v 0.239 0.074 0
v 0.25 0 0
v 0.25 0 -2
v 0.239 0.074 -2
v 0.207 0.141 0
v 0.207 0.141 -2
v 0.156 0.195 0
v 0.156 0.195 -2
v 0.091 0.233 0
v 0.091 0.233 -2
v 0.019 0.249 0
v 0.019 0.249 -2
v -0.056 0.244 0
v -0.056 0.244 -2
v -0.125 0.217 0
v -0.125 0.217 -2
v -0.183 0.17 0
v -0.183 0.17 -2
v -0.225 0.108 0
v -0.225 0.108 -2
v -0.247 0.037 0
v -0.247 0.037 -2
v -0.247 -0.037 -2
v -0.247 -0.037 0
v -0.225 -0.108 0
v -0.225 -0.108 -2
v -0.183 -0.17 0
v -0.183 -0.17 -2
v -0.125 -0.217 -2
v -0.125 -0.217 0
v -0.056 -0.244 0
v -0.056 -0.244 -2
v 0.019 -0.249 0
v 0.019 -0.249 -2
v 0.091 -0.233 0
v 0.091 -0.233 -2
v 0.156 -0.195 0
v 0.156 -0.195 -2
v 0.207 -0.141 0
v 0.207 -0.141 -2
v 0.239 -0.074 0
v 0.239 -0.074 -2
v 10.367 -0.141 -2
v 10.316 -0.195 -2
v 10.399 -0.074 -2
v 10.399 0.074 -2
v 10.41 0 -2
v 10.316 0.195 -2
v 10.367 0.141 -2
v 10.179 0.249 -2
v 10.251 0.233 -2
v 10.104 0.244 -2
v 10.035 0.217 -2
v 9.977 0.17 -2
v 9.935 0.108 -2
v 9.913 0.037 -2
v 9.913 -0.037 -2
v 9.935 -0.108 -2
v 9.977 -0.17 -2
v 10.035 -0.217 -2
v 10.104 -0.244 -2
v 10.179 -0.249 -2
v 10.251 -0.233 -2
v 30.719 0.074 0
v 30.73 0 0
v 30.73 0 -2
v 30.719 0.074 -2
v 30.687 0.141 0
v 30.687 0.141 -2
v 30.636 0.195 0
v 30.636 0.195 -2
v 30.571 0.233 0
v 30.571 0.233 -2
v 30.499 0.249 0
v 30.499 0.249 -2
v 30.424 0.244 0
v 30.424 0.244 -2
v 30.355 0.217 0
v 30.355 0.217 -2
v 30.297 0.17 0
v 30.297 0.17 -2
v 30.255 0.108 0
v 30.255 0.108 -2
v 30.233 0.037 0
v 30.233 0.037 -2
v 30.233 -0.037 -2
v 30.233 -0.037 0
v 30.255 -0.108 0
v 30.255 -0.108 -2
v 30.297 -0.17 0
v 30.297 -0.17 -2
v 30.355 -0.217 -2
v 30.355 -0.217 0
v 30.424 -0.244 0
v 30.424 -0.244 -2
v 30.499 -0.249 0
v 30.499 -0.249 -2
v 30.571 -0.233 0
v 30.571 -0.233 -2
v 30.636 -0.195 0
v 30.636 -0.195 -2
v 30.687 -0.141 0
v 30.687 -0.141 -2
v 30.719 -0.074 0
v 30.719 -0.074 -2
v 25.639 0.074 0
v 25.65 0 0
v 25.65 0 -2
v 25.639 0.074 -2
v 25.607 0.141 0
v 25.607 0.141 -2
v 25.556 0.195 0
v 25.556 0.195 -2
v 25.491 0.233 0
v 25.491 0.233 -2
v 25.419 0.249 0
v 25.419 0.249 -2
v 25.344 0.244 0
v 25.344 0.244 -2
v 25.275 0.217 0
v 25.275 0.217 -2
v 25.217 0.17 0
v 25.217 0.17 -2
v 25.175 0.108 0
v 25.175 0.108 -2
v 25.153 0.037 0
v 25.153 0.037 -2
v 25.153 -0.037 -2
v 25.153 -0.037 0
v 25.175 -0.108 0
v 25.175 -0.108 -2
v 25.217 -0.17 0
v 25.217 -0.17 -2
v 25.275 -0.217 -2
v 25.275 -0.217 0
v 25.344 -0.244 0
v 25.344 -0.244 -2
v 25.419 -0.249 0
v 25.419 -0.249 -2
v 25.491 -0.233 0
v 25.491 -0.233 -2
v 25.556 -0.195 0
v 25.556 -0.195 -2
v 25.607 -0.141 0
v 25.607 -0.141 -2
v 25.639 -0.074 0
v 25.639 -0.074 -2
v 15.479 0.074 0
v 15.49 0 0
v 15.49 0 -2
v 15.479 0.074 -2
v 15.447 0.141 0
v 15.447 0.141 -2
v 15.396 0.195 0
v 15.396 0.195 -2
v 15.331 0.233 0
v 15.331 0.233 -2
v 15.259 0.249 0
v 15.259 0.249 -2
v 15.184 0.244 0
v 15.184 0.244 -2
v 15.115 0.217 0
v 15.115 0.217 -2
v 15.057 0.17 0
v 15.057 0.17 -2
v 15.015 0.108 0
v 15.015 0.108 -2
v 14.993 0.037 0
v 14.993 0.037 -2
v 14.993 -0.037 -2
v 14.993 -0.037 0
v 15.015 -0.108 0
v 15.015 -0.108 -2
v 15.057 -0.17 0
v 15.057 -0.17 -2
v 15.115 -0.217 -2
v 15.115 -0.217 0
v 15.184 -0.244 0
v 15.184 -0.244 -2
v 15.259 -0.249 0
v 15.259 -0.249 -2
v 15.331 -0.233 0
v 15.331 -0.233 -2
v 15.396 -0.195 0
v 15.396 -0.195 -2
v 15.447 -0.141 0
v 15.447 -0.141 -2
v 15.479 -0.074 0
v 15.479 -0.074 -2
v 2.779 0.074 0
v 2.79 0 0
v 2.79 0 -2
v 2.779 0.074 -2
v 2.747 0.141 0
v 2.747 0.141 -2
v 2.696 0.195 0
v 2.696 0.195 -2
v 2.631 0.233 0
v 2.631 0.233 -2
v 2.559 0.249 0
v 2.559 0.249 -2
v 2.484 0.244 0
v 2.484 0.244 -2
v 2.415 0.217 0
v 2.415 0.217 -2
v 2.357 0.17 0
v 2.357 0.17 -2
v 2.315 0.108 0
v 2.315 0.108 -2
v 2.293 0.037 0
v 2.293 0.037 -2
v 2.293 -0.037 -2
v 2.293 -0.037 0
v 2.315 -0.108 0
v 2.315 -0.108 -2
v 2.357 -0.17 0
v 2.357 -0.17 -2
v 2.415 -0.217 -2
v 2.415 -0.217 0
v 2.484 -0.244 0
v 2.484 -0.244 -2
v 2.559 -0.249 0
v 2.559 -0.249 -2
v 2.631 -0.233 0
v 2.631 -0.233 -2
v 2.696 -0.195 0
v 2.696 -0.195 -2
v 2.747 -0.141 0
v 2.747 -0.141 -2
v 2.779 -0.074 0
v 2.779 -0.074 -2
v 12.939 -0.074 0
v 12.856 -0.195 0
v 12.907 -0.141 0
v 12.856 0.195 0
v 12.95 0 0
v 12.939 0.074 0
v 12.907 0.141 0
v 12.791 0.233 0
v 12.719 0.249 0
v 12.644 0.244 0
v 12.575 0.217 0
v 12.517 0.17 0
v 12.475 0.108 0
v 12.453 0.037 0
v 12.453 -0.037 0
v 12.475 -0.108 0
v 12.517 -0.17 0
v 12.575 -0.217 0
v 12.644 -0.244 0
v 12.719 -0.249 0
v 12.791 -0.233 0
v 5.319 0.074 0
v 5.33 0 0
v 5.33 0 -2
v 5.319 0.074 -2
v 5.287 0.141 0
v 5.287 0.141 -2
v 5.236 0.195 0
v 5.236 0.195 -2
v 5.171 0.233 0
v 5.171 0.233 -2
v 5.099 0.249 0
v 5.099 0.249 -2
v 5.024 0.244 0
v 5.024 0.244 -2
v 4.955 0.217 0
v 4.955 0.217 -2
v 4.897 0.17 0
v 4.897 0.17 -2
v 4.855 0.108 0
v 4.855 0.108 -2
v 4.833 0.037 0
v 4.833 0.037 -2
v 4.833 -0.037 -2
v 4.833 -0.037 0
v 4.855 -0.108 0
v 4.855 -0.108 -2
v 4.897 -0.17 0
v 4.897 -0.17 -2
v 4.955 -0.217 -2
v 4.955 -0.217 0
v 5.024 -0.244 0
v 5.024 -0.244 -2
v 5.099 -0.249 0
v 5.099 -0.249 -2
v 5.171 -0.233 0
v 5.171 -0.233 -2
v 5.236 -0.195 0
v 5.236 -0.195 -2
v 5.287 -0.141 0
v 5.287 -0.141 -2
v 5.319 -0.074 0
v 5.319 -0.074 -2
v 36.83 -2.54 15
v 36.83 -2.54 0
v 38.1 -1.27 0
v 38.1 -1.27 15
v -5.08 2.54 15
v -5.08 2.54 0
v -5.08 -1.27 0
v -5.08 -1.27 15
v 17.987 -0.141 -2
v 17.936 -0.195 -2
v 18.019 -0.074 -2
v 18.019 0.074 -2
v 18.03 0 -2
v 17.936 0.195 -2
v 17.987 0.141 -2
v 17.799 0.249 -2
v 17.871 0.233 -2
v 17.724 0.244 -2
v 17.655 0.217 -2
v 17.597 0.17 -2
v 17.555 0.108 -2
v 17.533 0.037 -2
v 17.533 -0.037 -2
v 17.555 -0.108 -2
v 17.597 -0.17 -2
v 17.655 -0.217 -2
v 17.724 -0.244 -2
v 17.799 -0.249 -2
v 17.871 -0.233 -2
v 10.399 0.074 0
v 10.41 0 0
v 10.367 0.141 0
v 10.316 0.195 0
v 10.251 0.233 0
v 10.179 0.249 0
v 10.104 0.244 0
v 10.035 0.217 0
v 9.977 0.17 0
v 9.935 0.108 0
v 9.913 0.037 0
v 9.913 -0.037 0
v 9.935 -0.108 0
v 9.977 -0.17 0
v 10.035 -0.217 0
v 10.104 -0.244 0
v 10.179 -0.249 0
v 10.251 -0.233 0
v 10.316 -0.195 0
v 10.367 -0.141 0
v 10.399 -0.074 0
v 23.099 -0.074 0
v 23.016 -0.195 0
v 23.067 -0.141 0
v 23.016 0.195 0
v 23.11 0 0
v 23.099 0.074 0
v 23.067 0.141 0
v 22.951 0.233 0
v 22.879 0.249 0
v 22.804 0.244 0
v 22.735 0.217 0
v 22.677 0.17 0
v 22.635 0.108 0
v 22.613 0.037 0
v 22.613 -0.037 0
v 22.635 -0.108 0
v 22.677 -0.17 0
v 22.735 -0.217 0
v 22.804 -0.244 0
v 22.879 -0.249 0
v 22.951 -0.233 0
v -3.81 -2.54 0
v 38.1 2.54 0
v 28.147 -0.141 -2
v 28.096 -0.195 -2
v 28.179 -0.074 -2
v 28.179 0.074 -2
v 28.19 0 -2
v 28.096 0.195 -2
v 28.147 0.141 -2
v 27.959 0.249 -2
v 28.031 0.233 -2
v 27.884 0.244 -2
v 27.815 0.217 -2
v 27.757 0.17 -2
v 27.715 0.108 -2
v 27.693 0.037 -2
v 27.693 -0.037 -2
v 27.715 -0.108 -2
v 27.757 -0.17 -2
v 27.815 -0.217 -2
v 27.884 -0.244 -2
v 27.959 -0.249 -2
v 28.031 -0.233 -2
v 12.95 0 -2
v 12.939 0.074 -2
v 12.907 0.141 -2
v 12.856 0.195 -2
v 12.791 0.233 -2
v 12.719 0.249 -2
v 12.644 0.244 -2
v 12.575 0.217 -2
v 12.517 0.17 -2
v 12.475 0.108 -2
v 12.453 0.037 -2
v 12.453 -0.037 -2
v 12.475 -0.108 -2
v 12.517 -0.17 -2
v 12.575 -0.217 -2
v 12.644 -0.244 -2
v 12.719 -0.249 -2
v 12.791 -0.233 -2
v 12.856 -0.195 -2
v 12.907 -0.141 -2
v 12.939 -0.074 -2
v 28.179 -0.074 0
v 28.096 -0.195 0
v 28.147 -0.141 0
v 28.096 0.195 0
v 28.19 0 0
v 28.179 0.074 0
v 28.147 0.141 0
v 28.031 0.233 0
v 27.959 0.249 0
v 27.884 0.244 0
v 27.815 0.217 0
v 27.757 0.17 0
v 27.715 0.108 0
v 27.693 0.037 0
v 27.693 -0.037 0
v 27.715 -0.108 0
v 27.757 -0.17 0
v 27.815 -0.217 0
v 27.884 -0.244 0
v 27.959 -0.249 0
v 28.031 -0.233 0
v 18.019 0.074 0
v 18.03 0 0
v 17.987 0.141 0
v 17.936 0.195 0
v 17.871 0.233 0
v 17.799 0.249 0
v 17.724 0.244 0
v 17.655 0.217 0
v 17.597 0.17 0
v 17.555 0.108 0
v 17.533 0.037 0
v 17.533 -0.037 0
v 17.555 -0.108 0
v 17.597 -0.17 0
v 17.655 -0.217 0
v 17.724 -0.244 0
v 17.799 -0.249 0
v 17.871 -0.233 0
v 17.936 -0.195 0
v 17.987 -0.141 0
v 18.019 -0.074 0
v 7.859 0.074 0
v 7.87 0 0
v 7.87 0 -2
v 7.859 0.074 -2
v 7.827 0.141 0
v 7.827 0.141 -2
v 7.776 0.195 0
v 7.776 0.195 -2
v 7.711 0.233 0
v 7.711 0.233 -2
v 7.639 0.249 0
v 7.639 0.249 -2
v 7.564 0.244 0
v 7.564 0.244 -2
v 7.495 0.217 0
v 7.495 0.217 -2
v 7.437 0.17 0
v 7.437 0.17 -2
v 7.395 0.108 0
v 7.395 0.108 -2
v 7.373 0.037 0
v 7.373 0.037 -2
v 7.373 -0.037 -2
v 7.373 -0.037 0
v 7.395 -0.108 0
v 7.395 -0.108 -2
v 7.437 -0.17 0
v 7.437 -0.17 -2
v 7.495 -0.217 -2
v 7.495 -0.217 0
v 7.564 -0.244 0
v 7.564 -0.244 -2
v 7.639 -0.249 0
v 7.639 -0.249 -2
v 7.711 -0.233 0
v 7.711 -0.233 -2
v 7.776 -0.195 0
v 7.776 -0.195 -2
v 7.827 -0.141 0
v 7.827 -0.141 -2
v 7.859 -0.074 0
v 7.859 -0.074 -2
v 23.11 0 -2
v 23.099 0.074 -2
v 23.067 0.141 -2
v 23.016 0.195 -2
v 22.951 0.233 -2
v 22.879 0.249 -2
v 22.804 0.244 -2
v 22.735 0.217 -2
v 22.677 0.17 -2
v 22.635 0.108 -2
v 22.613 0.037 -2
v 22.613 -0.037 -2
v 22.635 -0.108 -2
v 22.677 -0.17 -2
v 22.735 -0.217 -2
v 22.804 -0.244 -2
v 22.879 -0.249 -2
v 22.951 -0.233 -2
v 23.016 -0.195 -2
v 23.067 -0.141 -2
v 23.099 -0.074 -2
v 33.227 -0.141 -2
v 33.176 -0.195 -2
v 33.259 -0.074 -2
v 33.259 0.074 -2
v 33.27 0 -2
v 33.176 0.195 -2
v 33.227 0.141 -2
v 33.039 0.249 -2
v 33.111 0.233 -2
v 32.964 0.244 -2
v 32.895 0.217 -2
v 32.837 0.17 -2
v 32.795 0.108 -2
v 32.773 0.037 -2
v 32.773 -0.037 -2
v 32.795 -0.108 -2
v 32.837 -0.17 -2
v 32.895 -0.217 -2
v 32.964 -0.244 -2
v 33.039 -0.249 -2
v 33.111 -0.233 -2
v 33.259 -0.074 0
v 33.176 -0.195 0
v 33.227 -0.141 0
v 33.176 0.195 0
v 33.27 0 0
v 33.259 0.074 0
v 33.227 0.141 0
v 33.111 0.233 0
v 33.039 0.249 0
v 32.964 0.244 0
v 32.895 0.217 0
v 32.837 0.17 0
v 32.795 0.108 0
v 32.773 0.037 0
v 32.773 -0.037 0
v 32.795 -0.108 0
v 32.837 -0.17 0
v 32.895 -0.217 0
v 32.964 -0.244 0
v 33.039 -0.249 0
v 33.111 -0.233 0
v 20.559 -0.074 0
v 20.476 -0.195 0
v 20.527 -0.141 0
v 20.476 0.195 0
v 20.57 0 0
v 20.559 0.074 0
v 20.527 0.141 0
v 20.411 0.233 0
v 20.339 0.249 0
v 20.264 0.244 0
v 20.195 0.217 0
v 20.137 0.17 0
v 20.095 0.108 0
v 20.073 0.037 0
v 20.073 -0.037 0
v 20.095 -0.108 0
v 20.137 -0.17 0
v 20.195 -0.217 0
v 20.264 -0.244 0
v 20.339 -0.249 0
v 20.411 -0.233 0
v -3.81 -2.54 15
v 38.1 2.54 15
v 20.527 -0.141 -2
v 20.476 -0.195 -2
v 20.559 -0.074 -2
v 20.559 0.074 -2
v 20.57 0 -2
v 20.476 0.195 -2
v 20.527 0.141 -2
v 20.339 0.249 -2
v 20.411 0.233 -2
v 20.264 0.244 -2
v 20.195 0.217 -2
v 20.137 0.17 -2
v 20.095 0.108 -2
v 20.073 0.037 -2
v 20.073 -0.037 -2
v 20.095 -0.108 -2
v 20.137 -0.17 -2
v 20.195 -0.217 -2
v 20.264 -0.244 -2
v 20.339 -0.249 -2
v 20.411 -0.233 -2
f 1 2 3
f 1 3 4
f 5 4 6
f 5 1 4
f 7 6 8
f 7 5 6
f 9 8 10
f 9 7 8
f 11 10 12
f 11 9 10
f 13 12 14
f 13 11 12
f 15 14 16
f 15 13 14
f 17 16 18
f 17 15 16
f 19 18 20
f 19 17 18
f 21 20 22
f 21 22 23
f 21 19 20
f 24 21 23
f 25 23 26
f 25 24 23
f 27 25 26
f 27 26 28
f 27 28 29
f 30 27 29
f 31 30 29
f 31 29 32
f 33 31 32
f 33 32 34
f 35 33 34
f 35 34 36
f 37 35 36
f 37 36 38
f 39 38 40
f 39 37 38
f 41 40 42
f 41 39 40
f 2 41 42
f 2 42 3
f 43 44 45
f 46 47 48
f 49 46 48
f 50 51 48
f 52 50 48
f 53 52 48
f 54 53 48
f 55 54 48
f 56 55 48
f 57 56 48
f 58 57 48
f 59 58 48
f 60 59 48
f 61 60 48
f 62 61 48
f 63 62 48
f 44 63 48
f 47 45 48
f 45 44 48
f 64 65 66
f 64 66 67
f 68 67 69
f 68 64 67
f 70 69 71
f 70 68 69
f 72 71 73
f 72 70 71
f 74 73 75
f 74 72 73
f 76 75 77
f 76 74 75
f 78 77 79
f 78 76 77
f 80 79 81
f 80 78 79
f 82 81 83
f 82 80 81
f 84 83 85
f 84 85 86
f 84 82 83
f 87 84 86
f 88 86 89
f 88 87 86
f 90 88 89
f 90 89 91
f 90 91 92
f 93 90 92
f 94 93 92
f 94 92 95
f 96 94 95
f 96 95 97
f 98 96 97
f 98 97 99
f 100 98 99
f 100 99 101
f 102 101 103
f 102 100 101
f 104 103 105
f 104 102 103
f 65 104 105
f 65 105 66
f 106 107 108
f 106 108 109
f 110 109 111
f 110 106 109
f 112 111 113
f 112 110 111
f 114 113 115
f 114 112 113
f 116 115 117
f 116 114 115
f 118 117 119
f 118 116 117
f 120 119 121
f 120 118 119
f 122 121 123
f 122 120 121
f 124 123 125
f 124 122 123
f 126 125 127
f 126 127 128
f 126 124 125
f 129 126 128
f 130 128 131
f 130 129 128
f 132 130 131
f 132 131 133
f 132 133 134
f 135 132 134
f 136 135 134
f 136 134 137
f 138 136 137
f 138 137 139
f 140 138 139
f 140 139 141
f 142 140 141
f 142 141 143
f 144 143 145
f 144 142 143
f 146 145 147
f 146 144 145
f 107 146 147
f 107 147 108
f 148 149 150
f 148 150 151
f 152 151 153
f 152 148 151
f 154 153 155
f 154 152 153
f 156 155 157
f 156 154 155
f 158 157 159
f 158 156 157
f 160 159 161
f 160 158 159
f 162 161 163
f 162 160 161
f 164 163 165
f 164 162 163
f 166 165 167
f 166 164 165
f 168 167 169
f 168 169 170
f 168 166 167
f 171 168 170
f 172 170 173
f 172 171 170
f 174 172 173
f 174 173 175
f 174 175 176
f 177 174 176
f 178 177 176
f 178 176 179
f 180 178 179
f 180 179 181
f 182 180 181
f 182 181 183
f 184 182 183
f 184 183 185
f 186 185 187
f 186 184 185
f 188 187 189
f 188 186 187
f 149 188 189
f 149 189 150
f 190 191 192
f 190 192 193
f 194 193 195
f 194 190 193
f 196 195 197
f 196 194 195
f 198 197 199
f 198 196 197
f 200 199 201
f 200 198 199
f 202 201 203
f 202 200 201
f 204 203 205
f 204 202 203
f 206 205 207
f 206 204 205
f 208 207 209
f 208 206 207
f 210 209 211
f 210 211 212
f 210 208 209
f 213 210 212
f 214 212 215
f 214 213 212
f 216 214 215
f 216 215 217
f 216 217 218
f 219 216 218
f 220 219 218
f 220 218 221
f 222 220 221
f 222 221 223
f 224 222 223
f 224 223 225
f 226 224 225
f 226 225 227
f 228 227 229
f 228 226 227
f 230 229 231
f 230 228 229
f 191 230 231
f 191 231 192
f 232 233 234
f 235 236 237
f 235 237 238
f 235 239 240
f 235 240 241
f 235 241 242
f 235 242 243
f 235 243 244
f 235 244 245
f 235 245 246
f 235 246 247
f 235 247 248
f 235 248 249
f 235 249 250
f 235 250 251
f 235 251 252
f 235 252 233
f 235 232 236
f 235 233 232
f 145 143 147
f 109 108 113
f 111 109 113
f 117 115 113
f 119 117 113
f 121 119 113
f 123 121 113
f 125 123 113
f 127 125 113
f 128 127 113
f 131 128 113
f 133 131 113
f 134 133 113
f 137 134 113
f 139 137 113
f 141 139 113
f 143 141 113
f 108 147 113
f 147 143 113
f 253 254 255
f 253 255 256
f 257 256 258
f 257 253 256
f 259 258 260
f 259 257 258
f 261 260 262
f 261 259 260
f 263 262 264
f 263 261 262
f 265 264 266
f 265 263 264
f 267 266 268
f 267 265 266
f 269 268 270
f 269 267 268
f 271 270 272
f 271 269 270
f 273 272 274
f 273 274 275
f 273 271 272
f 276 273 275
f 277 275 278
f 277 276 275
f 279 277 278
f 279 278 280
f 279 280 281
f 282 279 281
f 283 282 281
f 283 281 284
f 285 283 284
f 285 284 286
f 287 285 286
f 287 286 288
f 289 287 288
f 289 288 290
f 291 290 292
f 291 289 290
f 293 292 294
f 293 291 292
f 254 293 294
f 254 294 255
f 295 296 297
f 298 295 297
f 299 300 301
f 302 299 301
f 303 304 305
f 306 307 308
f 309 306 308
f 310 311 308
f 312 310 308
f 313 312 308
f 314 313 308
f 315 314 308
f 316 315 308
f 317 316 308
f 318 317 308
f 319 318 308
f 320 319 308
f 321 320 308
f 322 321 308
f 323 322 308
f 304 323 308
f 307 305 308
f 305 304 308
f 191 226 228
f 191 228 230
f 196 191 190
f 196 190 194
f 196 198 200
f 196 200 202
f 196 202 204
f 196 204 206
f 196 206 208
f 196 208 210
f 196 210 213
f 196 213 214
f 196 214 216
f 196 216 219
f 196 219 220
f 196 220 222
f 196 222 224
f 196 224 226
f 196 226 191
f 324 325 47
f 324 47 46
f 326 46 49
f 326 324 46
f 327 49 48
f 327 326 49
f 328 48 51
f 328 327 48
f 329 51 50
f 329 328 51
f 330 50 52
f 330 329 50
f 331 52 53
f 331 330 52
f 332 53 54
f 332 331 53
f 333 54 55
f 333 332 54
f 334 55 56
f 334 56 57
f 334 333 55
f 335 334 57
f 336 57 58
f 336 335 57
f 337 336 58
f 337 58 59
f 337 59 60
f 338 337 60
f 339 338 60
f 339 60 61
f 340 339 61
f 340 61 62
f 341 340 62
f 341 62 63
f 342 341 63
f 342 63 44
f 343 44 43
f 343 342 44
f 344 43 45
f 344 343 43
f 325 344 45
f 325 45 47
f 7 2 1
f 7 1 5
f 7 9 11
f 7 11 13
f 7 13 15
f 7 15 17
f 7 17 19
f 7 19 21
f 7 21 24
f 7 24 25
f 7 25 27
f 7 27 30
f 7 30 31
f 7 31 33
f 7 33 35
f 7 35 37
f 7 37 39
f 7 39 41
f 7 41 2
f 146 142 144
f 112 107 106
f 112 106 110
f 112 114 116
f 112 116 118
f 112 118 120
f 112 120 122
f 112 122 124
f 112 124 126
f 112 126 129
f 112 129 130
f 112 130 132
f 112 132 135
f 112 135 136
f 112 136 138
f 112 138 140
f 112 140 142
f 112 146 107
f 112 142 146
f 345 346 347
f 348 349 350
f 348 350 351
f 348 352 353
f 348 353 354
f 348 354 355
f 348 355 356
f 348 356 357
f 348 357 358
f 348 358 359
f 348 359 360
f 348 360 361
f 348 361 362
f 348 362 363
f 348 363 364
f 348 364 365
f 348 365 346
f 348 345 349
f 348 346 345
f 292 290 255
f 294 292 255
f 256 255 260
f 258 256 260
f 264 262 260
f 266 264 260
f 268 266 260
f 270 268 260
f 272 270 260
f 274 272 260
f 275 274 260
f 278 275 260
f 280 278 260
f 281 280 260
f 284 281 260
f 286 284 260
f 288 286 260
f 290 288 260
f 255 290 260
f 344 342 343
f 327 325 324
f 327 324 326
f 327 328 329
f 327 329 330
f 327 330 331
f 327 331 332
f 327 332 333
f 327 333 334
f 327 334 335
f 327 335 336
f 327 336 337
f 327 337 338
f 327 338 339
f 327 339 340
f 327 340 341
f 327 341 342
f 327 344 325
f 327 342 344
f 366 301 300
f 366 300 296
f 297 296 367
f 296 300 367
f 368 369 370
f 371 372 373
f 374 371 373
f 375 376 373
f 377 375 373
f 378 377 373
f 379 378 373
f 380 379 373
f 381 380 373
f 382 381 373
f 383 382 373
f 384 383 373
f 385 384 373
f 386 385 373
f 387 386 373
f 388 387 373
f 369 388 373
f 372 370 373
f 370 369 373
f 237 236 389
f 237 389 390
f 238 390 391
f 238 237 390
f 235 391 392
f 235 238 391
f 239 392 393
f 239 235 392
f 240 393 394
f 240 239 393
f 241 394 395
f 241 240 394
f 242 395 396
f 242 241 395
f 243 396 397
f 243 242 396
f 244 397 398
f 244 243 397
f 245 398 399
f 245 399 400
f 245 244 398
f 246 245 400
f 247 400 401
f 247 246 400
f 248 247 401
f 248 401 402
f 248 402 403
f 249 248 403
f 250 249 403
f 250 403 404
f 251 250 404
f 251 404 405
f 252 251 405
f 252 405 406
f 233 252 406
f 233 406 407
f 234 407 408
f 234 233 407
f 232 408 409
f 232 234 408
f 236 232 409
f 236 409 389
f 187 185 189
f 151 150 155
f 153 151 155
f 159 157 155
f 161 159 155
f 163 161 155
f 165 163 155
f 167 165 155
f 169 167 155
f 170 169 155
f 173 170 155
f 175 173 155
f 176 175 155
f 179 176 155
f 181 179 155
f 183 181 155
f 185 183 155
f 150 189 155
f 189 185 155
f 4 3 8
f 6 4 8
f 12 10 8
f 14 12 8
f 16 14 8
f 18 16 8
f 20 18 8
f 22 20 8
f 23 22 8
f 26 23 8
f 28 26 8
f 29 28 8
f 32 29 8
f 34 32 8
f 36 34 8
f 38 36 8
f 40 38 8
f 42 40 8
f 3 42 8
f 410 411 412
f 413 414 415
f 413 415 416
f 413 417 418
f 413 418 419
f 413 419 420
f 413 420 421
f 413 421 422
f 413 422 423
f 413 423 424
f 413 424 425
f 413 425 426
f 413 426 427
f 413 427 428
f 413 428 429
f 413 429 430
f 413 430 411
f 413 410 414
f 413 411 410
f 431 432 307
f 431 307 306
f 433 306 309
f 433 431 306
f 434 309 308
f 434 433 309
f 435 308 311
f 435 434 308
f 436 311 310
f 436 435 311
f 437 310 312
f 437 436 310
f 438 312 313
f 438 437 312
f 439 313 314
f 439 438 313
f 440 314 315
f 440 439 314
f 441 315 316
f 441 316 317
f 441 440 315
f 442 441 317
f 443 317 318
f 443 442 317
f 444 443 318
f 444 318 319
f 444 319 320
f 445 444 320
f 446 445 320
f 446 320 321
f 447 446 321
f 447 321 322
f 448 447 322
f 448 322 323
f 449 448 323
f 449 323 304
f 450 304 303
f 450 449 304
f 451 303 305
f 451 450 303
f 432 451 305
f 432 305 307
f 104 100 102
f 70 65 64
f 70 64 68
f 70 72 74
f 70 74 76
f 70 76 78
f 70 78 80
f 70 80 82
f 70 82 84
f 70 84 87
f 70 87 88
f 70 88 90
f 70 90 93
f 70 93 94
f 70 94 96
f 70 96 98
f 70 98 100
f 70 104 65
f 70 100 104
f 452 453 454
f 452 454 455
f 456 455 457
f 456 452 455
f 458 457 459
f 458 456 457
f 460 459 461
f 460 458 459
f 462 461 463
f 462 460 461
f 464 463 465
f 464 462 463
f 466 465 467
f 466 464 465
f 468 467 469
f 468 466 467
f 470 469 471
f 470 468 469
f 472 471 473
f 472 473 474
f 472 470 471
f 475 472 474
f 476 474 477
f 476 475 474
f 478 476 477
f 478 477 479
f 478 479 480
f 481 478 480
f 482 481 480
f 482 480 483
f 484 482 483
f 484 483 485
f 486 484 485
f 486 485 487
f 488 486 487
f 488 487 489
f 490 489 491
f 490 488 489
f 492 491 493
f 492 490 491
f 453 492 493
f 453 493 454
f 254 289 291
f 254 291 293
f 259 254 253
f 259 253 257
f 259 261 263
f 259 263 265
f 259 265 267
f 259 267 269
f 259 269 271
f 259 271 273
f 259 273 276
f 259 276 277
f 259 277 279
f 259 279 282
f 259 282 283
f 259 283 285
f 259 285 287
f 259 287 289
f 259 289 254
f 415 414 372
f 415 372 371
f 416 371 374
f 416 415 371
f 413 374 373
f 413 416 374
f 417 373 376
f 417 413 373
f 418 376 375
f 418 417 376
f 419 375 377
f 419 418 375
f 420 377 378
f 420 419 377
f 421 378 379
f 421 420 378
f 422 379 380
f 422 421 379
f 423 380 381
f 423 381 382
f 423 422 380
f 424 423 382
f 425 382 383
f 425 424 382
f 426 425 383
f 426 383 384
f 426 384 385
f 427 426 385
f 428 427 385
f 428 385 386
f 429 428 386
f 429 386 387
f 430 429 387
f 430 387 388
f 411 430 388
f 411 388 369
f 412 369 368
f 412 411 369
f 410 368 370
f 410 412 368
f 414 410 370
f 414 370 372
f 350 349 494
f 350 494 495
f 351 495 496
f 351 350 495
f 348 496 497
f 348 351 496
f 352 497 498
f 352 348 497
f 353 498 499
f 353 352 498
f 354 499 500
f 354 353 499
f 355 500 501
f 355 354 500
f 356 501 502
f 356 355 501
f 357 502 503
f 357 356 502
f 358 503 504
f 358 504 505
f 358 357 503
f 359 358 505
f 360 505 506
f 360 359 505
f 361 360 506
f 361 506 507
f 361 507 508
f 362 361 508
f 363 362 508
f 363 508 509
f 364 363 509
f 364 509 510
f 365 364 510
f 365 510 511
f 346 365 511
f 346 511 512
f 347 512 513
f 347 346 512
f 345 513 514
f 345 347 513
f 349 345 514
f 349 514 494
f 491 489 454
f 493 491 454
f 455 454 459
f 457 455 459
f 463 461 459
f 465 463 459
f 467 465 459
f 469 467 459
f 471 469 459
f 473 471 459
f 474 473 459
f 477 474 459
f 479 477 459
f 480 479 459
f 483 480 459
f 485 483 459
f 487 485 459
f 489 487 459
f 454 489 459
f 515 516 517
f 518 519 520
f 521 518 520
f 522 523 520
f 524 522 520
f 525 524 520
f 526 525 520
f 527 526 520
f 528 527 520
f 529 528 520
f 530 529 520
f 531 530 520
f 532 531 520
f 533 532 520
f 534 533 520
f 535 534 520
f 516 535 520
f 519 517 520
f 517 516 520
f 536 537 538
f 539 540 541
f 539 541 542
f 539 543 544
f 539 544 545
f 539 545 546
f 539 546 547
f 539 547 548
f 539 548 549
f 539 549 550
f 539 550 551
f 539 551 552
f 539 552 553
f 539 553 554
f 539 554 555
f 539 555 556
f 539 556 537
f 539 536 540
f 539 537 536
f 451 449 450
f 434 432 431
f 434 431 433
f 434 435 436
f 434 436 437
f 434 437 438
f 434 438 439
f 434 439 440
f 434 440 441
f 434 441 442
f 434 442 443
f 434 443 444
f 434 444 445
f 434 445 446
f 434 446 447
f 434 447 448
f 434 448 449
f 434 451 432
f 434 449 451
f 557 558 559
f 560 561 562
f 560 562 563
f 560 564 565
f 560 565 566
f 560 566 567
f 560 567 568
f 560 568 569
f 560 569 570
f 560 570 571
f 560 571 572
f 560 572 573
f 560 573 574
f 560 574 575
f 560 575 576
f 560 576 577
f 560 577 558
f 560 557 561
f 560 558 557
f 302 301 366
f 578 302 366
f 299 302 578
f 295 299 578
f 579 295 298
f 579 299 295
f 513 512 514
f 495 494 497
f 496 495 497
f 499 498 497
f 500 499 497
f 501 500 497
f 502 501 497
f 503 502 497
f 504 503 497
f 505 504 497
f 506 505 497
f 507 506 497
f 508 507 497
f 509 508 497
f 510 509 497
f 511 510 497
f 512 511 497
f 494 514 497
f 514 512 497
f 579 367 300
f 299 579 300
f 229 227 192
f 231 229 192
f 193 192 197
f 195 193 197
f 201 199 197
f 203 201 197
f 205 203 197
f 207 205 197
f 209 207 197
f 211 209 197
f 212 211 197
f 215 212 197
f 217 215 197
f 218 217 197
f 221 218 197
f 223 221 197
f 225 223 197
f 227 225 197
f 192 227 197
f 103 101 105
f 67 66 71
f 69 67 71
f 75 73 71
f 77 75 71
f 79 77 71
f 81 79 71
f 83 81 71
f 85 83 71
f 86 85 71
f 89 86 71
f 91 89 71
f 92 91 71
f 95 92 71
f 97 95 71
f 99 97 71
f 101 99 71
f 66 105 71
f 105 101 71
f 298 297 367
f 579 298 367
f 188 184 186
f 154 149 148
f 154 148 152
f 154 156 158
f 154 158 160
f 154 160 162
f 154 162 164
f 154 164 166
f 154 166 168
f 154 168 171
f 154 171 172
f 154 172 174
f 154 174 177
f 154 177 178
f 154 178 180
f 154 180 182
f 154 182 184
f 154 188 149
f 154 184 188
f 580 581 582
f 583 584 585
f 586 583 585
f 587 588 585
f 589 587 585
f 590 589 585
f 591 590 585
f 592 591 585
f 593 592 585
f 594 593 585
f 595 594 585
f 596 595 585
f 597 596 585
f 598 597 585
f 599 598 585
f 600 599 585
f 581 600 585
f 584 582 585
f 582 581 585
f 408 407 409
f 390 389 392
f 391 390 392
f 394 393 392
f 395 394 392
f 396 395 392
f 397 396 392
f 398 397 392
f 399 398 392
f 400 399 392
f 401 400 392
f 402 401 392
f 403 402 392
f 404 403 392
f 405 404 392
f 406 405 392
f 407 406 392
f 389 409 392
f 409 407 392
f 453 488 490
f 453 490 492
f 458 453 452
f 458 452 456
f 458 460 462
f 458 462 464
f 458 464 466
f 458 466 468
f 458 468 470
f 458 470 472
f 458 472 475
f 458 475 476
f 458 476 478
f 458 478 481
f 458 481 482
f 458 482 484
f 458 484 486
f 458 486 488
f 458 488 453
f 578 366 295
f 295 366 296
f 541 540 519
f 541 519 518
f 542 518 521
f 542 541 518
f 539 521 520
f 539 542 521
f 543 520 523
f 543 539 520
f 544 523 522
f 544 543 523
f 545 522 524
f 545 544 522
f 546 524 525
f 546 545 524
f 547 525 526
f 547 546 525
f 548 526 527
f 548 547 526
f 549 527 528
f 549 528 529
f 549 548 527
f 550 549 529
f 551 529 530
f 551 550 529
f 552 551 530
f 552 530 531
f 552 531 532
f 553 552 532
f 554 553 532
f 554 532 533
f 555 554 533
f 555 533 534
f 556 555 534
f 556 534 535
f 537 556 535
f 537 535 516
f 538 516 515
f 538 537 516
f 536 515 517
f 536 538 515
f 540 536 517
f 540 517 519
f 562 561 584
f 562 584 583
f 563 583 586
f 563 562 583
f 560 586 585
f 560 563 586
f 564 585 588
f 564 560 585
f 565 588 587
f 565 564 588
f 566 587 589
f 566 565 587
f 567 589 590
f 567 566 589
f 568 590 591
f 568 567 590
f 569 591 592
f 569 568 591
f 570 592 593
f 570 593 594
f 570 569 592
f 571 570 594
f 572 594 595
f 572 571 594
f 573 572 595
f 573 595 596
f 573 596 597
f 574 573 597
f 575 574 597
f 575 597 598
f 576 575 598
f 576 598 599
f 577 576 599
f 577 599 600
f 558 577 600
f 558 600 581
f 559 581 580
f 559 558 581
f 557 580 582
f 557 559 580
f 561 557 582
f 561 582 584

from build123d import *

# Parameters (mm, degrees)
COMPONENT_OUTLINE_DEPTH = 15
SKETCH2_R               = 0.25
EXTRUDE_1_DEPTH         = 2
SKETCH3_R               = 0.25
EXTRUDE_2_DEPTH         = 2
SKETCH4_R               = 0.25
EXTRUDE_3_DEPTH         = 2
SKETCH5_R               = 0.25
EXTRUDE_4_DEPTH         = 2
SKETCH6_R               = 0.25
EXTRUDE_5_DEPTH         = 2
SKETCH7_R               = 0.25
EXTRUDE_6_DEPTH         = 2
SKETCH8_R               = 0.25
EXTRUDE_7_DEPTH         = 2
SKETCH9_R               = 0.25
EXTRUDE_8_DEPTH         = 2
SKETCH10_R              = 0.25
EXTRUDE_9_DEPTH         = 2
SKETCH11_R              = 0.25
EXTRUDE_10_DEPTH        = 2
SKETCH12_R              = 0.25
EXTRUDE_11_DEPTH        = 2
SKETCH13_R              = 0.25
EXTRUDE_12_DEPTH        = 2
SKETCH14_R              = 0.25
EXTRUDE_13_DEPTH        = 2
SKETCH15_R              = 0.25
EXTRUDE_14_DEPTH        = 2


with BuildPart() as part:
    # Sketch1 → Component_Outline (new body)
    with BuildSketch(Plane.XY):
        Polygon((-5.08, 2.54), (-5.08, -1.27), (-3.81, -2.54), (36.83, -2.54), (38.1, -1.27), (38.1, 2.54), align=None)
    extrude(amount=COMPONENT_OUTLINE_DEPTH)


with BuildPart() as body_2:
    # Sketch2 → Extrude 1 (new body)
    with BuildSketch(Plane.XY):
        Circle(SKETCH2_R)
    extrude(amount=-EXTRUDE_1_DEPTH)


with BuildPart() as body_3:
    # Sketch3 → Extrude 2 (new body)
    with BuildSketch(Plane.XY):
        with Locations((2.54, 0)):
            Circle(SKETCH3_R)
    extrude(amount=-EXTRUDE_2_DEPTH)


with BuildPart() as body_4:
    # Sketch4 → Extrude 3 (new body)
    with BuildSketch(Plane.XY):
        with Locations((5.08, 0)):
            Circle(SKETCH4_R)
    extrude(amount=-EXTRUDE_3_DEPTH)


with BuildPart() as body_5:
    # Sketch5 → Extrude 4 (new body)
    with BuildSketch(Plane.XY):
        with Locations((7.62, 0)):
            Circle(SKETCH5_R)
    extrude(amount=-EXTRUDE_4_DEPTH)


with BuildPart() as body_6:
    # Sketch6 → Extrude 5 (new body)
    with BuildSketch(Plane.XY):
        with Locations((10.16, 0)):
            Circle(SKETCH6_R)
    extrude(amount=-EXTRUDE_5_DEPTH)


with BuildPart() as body_7:
    # Sketch7 → Extrude 6 (new body)
    with BuildSketch(Plane.XY):
        with Locations((12.7, 0)):
            Circle(SKETCH7_R)
    extrude(amount=-EXTRUDE_6_DEPTH)


with BuildPart() as body_8:
    # Sketch8 → Extrude 7 (new body)
    with BuildSketch(Plane.XY):
        with Locations((15.24, 0)):
            Circle(SKETCH8_R)
    extrude(amount=-EXTRUDE_7_DEPTH)


with BuildPart() as body_9:
    # Sketch9 → Extrude 8 (new body)
    with BuildSketch(Plane.XY):
        with Locations((17.78, 0)):
            Circle(SKETCH9_R)
    extrude(amount=-EXTRUDE_8_DEPTH)


with BuildPart() as body_10:
    # Sketch10 → Extrude 9 (new body)
    with BuildSketch(Plane.XY):
        with Locations((20.32, 0)):
            Circle(SKETCH10_R)
    extrude(amount=-EXTRUDE_9_DEPTH)


with BuildPart() as body_11:
    # Sketch11 → Extrude 10 (new body)
    with BuildSketch(Plane.XY):
        with Locations((22.86, 0)):
            Circle(SKETCH11_R)
    extrude(amount=-EXTRUDE_10_DEPTH)


with BuildPart() as body_12:
    # Sketch12 → Extrude 11 (new body)
    with BuildSketch(Plane.XY):
        with Locations((25.4, 0)):
            Circle(SKETCH12_R)
    extrude(amount=-EXTRUDE_11_DEPTH)


with BuildPart() as body_13:
    # Sketch13 → Extrude 12 (new body)
    with BuildSketch(Plane.XY):
        with Locations((27.94, 0)):
            Circle(SKETCH13_R)
    extrude(amount=-EXTRUDE_12_DEPTH)


with BuildPart() as body_14:
    # Sketch14 → Extrude 13 (new body)
    with BuildSketch(Plane.XY):
        with Locations((30.48, 0)):
            Circle(SKETCH14_R)
    extrude(amount=-EXTRUDE_13_DEPTH)


with BuildPart() as body_15:
    # Sketch15 → Extrude 14 (new body)
    with BuildSketch(Plane.XY):
        with Locations((33.02, 0)):
            Circle(SKETCH15_R)
    extrude(amount=-EXTRUDE_14_DEPTH)


solid = Compound([part.part, body_2.part, body_3.part, body_4.part, body_5.part, body_6.part, body_7.part, body_8.part, body_9.part, body_10.part, body_11.part, body_12.part, body_13.part, body_14.part, body_15.part])
